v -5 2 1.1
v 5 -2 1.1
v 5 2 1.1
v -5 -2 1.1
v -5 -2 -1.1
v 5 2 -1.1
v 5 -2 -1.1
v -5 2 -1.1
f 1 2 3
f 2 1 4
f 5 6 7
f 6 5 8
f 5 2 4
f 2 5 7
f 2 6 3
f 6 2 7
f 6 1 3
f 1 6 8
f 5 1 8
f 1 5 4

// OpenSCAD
//OLED Spacer

$fn=60;

cube(size = [10,4,2.2], center = true);
